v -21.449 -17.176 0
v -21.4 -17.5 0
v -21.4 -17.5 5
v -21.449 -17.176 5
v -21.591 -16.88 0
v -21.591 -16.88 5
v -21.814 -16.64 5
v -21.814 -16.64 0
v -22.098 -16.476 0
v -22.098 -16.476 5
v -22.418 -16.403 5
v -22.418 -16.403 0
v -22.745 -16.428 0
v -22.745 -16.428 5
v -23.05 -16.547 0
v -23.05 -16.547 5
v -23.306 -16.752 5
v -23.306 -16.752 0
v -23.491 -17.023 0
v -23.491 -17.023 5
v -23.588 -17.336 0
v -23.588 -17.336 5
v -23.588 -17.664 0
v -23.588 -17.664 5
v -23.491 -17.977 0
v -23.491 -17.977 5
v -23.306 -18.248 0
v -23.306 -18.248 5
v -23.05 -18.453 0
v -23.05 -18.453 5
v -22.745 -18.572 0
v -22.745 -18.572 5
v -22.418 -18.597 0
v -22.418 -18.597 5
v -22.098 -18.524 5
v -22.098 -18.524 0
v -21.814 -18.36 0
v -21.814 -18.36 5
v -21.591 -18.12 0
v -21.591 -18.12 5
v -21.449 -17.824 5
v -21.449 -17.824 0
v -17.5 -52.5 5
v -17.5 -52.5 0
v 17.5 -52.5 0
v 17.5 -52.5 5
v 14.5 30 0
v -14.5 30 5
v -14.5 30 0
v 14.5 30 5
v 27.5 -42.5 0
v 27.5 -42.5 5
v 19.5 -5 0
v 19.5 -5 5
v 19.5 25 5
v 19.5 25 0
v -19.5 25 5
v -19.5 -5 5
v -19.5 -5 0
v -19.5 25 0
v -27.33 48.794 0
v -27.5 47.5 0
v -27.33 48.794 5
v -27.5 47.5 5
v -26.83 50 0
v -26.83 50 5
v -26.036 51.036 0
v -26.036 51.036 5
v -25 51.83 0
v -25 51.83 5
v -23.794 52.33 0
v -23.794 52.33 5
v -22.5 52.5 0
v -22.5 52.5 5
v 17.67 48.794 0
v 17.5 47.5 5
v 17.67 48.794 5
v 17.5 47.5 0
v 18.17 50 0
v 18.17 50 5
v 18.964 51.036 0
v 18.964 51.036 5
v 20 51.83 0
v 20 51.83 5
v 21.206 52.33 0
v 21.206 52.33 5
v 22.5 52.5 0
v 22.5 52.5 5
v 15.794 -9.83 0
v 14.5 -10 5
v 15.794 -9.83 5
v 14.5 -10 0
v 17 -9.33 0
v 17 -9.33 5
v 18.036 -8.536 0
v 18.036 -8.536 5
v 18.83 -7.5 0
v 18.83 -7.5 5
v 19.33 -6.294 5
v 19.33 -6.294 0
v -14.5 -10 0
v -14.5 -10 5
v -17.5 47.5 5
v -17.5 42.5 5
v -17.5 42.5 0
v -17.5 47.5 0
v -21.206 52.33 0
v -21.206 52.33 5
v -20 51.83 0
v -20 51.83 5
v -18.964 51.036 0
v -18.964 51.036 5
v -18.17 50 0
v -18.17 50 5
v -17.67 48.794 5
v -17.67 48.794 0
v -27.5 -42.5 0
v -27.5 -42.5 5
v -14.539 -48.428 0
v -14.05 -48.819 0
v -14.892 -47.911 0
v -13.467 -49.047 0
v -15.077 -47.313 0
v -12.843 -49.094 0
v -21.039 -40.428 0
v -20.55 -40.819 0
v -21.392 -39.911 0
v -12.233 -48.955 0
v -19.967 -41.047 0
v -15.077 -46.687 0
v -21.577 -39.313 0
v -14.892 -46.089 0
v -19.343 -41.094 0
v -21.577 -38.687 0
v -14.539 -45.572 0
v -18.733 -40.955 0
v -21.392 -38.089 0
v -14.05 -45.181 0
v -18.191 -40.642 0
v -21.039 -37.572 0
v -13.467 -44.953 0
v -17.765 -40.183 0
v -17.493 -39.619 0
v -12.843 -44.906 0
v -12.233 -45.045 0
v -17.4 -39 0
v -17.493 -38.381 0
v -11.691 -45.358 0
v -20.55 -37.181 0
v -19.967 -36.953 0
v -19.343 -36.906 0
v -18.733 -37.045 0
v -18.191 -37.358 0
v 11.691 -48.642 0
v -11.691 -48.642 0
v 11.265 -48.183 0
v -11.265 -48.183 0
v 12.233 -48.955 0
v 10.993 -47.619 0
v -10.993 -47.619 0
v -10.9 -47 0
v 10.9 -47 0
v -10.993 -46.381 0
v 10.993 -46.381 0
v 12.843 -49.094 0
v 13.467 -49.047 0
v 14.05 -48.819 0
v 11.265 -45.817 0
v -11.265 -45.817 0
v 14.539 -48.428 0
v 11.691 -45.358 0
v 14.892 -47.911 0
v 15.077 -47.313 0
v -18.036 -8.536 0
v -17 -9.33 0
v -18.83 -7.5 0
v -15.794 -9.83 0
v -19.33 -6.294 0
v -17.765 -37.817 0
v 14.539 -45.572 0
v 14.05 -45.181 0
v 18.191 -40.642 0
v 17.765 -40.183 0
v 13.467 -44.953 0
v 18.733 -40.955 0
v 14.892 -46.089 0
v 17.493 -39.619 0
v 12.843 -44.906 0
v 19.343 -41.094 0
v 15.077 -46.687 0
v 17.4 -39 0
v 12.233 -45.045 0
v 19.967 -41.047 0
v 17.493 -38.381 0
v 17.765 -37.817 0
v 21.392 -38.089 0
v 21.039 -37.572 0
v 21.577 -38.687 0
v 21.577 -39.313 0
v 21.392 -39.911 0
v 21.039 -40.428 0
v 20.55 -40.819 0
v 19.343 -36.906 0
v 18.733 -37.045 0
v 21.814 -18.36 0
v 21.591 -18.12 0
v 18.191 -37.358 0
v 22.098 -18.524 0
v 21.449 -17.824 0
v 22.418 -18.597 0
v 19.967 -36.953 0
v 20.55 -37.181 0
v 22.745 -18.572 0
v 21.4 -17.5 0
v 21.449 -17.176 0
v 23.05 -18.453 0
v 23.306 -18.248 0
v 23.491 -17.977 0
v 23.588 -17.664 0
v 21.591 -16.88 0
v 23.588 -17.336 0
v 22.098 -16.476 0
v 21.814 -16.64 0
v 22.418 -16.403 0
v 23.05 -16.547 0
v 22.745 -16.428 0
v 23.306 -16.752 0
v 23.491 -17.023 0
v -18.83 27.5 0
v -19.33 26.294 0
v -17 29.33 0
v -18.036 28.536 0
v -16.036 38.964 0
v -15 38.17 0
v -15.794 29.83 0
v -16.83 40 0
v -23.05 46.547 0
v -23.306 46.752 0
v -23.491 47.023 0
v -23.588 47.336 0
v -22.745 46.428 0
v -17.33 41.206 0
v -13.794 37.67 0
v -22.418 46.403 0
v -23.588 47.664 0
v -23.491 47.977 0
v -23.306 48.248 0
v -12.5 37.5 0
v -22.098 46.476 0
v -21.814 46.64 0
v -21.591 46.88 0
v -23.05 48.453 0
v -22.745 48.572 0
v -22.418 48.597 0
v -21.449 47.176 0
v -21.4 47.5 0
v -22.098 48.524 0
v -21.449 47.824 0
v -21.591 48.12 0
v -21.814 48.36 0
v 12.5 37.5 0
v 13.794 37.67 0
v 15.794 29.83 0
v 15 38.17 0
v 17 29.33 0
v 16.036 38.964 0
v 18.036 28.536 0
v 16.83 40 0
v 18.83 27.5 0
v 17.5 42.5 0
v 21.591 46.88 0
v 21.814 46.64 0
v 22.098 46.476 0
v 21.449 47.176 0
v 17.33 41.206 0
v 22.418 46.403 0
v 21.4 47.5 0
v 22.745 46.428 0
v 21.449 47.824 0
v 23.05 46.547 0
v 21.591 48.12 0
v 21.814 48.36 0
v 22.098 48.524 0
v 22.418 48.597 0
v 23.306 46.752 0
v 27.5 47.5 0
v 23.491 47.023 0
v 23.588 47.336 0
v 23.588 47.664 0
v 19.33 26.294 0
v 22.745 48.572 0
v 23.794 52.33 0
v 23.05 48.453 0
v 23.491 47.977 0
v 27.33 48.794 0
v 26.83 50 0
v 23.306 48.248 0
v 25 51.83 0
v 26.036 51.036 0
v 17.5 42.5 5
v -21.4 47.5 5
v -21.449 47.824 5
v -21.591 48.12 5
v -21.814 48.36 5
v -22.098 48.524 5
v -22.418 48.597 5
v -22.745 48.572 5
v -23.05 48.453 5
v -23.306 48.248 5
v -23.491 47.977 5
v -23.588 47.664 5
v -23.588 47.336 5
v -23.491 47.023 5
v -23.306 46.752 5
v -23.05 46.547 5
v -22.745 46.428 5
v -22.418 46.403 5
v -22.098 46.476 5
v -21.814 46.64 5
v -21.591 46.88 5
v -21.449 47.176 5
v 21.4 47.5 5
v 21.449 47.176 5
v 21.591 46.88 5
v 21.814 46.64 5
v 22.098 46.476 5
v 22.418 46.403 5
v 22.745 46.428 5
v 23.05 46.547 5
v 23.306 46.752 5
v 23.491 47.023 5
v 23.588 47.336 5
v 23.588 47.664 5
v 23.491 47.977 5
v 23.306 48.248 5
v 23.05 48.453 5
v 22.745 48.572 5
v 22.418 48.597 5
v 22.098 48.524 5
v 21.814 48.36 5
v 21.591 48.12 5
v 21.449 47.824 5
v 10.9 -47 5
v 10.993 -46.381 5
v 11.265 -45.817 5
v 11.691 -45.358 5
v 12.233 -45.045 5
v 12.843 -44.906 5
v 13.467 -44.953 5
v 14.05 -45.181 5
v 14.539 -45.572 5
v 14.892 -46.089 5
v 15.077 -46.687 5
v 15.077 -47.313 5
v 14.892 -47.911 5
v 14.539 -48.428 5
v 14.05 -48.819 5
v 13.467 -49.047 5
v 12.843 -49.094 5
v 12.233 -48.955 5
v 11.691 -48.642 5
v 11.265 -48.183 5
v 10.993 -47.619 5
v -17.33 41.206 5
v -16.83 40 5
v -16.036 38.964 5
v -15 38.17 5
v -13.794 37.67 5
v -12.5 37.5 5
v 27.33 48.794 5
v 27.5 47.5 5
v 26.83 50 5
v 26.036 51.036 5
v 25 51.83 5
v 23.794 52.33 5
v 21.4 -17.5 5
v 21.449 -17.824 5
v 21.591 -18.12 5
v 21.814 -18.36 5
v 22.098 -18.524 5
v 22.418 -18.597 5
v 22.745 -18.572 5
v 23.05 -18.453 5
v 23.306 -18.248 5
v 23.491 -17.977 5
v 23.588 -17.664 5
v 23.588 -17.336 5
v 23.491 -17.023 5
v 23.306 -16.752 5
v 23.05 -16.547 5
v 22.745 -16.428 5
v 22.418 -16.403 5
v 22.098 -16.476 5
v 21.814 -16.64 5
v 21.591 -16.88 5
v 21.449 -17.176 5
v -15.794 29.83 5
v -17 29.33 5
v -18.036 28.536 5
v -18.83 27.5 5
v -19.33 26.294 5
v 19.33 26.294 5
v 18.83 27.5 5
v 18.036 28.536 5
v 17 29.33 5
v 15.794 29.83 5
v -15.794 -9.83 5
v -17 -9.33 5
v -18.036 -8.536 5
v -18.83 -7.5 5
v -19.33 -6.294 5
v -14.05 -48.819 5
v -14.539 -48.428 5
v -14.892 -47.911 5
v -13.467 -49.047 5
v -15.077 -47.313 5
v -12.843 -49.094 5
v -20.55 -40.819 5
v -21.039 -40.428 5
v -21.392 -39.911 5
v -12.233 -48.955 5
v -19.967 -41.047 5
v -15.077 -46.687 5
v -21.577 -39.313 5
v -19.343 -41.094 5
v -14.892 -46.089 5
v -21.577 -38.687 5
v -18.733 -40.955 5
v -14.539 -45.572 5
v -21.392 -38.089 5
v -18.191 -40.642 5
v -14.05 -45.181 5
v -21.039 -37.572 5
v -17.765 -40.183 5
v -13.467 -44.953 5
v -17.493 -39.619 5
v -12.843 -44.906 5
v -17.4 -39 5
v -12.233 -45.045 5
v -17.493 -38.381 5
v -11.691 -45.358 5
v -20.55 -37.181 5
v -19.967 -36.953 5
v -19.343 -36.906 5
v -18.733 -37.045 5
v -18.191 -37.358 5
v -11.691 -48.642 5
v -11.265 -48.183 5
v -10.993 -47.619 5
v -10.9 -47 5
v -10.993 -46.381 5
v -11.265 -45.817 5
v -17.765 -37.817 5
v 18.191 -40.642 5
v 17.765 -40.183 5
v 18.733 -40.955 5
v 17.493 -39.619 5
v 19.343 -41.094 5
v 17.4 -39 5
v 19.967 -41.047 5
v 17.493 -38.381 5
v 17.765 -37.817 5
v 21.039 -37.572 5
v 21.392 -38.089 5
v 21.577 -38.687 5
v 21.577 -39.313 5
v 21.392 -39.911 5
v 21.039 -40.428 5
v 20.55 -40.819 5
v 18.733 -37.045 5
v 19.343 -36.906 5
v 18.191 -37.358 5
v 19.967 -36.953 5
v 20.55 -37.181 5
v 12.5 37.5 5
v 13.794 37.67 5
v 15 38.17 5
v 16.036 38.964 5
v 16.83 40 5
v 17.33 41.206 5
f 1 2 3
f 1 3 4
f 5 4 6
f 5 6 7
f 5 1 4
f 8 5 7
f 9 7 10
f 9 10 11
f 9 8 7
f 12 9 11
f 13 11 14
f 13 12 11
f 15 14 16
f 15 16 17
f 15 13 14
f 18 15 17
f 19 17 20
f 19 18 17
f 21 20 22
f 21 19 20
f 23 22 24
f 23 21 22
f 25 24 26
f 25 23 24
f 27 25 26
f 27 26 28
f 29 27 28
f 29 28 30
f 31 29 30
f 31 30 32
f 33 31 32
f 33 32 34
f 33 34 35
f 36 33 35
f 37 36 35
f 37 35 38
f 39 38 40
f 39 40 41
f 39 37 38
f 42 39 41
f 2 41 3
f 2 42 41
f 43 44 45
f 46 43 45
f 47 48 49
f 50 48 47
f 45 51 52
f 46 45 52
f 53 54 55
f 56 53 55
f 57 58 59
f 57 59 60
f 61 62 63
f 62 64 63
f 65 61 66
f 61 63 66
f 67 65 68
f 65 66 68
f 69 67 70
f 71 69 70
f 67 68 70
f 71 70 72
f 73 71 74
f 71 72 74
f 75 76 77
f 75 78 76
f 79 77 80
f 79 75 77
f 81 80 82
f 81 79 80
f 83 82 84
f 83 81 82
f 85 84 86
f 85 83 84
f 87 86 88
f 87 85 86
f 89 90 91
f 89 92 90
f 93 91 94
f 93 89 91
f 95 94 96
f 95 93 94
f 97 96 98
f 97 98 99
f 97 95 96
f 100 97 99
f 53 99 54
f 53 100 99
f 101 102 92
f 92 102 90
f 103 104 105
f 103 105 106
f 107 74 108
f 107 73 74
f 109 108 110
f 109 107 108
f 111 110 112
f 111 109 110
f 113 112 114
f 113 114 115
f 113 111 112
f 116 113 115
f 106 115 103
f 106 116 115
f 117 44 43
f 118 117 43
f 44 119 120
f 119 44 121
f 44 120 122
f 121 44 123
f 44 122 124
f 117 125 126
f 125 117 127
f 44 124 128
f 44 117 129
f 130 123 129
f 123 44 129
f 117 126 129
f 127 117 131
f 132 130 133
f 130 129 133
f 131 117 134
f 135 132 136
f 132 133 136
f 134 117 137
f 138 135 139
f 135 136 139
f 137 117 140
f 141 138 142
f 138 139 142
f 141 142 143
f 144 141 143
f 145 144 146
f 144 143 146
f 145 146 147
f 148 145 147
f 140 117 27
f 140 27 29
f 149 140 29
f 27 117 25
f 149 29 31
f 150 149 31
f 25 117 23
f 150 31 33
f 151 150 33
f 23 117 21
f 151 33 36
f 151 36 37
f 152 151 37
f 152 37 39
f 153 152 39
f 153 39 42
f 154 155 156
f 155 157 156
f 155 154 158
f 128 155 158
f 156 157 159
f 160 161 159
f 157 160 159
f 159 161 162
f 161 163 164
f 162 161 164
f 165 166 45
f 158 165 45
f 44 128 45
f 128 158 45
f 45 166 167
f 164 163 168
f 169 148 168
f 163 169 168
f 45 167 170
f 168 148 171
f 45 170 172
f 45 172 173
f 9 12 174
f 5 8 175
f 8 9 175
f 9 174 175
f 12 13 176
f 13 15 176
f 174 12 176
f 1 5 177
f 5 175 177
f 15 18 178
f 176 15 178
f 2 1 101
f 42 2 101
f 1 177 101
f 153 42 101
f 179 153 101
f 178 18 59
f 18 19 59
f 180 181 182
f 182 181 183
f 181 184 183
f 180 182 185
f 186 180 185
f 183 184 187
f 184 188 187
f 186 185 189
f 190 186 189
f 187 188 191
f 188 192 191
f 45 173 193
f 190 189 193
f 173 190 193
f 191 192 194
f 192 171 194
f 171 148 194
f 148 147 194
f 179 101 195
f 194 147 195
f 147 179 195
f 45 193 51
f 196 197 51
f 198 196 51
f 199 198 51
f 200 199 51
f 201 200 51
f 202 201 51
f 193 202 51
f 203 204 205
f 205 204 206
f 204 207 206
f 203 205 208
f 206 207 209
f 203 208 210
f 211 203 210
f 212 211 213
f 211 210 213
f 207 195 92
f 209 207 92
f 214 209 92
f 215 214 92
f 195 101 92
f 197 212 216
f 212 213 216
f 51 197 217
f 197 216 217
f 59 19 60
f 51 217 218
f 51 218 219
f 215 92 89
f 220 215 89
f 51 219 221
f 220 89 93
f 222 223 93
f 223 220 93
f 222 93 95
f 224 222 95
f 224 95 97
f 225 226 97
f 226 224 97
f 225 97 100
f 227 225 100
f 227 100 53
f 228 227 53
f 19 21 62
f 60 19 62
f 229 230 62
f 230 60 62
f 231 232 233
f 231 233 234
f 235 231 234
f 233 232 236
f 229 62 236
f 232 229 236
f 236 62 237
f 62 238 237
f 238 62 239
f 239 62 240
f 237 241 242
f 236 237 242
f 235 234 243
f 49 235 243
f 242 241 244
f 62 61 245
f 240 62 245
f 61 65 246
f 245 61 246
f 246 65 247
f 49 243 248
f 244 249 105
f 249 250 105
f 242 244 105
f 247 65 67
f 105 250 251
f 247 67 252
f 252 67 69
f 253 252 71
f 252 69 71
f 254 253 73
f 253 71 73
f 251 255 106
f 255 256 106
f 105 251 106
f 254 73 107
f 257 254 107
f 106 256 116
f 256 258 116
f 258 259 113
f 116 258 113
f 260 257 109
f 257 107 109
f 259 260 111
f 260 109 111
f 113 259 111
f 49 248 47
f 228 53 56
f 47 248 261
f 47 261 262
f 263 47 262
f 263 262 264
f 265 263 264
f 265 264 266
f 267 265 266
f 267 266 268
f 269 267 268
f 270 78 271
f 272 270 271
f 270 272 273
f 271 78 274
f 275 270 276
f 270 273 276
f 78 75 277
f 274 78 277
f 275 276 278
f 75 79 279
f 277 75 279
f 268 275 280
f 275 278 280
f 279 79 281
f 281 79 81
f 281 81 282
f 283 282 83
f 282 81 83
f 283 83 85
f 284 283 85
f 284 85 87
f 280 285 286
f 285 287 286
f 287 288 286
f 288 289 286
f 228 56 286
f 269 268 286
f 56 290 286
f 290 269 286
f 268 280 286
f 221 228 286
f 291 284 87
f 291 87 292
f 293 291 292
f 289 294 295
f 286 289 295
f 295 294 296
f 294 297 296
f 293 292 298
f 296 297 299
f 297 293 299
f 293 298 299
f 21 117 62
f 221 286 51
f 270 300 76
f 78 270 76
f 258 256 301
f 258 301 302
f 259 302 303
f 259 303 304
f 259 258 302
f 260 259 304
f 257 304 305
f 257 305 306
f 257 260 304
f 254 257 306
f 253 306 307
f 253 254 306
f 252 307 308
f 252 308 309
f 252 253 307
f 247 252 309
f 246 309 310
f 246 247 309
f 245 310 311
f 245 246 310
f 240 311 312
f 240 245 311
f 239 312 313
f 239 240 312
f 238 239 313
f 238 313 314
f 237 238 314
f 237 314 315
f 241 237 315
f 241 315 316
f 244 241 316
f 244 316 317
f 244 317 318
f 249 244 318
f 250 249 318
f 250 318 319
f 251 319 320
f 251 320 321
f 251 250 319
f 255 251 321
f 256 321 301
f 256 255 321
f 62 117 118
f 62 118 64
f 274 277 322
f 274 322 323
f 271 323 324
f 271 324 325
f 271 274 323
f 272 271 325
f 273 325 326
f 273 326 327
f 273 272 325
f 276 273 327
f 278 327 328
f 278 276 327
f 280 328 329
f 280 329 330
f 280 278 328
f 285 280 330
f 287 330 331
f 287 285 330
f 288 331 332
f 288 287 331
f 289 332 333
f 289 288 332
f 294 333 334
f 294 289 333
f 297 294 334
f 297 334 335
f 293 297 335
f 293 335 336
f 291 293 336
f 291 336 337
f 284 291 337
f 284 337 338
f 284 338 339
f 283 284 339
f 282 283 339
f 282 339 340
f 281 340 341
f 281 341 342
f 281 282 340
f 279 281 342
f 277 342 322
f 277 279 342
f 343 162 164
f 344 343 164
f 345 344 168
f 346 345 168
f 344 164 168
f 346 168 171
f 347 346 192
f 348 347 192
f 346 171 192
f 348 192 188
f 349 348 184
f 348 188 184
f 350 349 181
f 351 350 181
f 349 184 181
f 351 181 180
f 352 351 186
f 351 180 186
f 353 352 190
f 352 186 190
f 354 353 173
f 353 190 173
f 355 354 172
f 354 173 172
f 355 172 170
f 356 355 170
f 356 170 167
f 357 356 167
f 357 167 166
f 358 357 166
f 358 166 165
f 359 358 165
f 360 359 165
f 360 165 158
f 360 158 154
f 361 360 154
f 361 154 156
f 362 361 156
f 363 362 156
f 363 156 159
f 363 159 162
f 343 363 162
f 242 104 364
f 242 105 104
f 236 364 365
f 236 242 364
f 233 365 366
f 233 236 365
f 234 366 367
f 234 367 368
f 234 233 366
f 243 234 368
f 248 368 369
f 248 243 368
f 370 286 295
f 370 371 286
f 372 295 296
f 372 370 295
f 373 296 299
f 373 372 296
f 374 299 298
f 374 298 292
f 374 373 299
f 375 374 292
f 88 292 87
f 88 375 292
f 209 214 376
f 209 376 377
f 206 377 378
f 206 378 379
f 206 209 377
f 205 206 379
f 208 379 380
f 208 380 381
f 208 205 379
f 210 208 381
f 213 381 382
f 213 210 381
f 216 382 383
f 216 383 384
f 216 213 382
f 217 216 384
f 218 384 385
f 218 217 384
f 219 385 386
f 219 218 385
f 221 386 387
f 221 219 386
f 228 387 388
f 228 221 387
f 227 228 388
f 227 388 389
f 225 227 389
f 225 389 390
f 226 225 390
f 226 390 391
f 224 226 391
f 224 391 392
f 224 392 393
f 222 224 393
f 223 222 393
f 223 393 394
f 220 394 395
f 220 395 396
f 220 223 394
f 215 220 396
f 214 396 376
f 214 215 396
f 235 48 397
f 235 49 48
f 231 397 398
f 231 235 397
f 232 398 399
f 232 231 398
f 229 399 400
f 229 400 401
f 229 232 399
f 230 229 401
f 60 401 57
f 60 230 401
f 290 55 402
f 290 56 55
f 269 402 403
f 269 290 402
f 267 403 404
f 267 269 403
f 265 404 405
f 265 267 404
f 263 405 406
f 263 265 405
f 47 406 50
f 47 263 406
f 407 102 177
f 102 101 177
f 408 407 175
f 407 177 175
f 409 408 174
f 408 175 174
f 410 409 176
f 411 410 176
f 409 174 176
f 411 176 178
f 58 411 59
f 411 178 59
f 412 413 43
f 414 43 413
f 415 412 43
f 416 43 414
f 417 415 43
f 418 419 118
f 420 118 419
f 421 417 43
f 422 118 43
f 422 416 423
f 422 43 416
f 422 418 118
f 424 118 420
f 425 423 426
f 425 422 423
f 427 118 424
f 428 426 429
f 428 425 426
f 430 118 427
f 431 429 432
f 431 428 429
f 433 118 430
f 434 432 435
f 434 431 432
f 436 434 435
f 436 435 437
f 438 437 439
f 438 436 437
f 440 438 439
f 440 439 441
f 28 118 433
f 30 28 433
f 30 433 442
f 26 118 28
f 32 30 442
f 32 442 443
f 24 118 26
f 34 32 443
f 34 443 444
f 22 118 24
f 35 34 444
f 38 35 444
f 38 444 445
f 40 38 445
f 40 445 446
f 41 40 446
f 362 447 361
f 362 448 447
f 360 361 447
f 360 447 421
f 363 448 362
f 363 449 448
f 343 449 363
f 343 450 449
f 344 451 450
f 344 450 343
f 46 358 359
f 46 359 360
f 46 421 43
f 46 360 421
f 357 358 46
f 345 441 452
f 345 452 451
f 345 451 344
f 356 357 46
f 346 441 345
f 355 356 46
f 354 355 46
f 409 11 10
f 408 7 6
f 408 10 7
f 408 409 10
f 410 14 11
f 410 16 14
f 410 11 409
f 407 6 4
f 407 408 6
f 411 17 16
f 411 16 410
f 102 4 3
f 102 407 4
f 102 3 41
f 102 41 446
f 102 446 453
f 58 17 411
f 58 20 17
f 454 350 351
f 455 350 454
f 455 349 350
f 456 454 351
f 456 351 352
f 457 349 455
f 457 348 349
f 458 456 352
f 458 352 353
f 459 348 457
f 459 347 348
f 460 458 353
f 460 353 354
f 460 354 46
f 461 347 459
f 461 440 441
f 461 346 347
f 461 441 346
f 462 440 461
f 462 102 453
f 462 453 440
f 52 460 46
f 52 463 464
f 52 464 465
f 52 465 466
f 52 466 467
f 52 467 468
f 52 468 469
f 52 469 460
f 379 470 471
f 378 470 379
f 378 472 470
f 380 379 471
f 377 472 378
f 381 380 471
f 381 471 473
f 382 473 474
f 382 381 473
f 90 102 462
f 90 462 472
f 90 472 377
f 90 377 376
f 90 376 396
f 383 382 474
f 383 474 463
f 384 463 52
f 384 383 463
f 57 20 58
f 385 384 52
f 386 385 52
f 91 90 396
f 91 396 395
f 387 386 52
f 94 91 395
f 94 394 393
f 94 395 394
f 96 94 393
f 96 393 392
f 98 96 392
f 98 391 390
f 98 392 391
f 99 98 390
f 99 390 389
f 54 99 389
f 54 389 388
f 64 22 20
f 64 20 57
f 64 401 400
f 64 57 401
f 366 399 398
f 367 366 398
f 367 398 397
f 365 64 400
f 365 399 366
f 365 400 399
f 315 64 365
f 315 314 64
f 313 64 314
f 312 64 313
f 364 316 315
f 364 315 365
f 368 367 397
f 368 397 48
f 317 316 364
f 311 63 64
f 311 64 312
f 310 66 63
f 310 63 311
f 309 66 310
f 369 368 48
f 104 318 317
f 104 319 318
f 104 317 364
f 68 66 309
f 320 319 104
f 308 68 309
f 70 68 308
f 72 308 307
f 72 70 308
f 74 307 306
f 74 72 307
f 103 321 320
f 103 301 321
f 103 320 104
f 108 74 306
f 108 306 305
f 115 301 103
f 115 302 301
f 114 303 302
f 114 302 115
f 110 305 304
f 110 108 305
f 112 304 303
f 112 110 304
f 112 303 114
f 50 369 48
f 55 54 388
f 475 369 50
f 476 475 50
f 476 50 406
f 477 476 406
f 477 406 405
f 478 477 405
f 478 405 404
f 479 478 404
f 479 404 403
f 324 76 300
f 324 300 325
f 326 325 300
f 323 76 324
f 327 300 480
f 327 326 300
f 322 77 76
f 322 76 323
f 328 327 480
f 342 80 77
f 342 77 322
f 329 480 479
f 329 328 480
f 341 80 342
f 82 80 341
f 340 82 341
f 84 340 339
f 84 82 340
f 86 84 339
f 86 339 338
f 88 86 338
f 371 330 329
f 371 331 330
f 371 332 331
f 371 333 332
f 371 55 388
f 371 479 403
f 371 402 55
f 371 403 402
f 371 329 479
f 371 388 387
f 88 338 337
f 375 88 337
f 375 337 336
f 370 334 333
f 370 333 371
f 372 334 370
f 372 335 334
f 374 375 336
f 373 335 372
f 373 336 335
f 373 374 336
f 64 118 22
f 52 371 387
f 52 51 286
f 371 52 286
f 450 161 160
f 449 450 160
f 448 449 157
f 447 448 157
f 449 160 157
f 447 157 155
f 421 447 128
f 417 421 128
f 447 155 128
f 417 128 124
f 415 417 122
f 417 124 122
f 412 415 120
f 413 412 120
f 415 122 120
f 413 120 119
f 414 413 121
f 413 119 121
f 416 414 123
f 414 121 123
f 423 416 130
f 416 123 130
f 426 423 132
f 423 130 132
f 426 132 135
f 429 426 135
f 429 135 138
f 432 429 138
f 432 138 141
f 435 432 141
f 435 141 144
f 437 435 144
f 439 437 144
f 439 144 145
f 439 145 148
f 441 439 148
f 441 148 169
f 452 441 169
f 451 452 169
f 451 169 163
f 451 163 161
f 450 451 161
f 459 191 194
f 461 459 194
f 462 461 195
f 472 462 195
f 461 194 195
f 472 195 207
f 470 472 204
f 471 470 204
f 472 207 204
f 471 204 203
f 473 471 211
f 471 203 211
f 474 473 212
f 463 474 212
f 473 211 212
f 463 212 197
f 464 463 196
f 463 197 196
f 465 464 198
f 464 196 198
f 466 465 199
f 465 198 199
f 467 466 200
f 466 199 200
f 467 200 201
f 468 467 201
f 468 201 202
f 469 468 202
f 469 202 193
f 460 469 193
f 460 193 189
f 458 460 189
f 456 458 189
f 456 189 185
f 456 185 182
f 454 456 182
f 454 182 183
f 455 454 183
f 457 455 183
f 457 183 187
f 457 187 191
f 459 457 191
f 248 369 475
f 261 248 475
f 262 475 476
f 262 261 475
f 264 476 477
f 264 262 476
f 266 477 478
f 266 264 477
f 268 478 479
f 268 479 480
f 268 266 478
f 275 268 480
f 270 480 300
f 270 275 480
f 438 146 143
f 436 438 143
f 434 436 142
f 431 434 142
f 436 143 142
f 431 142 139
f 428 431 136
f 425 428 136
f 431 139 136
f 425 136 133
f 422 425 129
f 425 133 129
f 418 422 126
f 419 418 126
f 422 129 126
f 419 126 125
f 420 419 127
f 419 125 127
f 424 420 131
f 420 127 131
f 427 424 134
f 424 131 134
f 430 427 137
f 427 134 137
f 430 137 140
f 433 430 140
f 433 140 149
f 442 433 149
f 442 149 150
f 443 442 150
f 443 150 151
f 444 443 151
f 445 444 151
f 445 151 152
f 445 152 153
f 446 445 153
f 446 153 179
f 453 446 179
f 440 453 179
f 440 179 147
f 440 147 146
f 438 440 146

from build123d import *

# Parameters (mm, degrees)
SKETCH_1_W          = 55
SKETCH_1_H          = 105
SKETCH_1_R          = 1.1
EXTRUDE_1_DEPTH     = 5
CHAMFER_1_SIZE      = 10
SKETCH_4_R          = 2.1
CUT_EXTRUDE_1_DEPTH = 10
SKETCH_5_W          = 35
SKETCH_5_H          = 15
CUT_EXTRUDE_2_DEPTH = 10
SKETCH_6_W          = 39
SKETCH_6_H          = 40
CUT_EXTRUDE_3_DEPTH = 10
FILLET_3_R          = 5
FILLET_4_R          = 5


with BuildPart() as part:
    # 草图1 → 凸台-拉伸1 (new body)
    with BuildSketch(Plane.XY):
        Rectangle(SKETCH_1_W, SKETCH_1_H)
        with Locations((-22.5, 47.5)):
            Circle(SKETCH_1_R, mode=Mode.SUBTRACT)
        with Locations(Location((22.5, 47.5, 0), (0, 0, 180))):
            Circle(SKETCH_1_R, mode=Mode.SUBTRACT)
        with Locations((-22.5, -17.5)):
            Circle(SKETCH_1_R, mode=Mode.SUBTRACT)
        with Locations(Location((22.5, -17.5, 0), (0, 0, 180))):
            Circle(SKETCH_1_R, mode=Mode.SUBTRACT)
    extrude(amount=EXTRUDE_1_DEPTH)

    # 倒角1
    chamfer_1_edges = [part.edges().sort_by_distance(p)[0] for p in [
        (27.5, -52.5, 2.5),
        (-27.5, -52.5, 2.5),
    ]]
    chamfer(chamfer_1_edges, length=CHAMFER_1_SIZE)

    # 草图4 → 切除-拉伸1 (cut)
    with BuildSketch(Plane(origin=(0, 0, 0), x_dir=(-1, 0, 0), z_dir=(0, 0, -1))):
        with Locations((-13, -47)):
            Circle(SKETCH_4_R)
        with Locations((-19.5, -39)):
            Circle(SKETCH_4_R)
        with Locations(Location((19.5, -39, 0), (0, 0, 180))):
            Circle(SKETCH_4_R)
        with Locations(Location((13, -47, 0), (0, 0, 180))):
            Circle(SKETCH_4_R)
    extrude(amount=-CUT_EXTRUDE_1_DEPTH, mode=Mode.SUBTRACT)

    # 草图5 → 切除-拉伸2 (cut)
    with BuildSketch(Plane.XY.offset(5)):
        with Locations((0, 45)):
            Rectangle(SKETCH_5_W, SKETCH_5_H)
    extrude(amount=-CUT_EXTRUDE_2_DEPTH, mode=Mode.SUBTRACT)

    # 草图6 → 切除-拉伸3 (cut)
    with BuildSketch(Plane.XY.offset(5)):
        with Locations((0, 10)):
            Rectangle(SKETCH_6_W, SKETCH_6_H)
    extrude(amount=-CUT_EXTRUDE_3_DEPTH, mode=Mode.SUBTRACT)

    # 圆角3
    fillet_3_edges = [part.edges().sort_by_distance(p)[0] for p in [
        (19.5, 30, 2.5),
        (19.5, -10, 2.5),
        (-19.5, -10, 2.5),
        (-19.5, 30, 2.5),
    ]]
    fillet(fillet_3_edges, radius=FILLET_3_R)

    # 圆角4
    fillet_4_edges = [part.edges().sort_by_distance(p)[0] for p in [
        (17.5, 52.5, 2.5),
        (27.5, 52.5, 2.5),
        (-27.5, 52.5, 2.5),
        (-17.5, 52.5, 2.5),
        (17.5, 37.5, 2.5),
        (-17.5, 37.5, 2.5),
    ]]
    fillet(fillet_4_edges, radius=FILLET_4_R - 0.0001)  # a hair under: the kernel refuses the full size


solid = part.part
